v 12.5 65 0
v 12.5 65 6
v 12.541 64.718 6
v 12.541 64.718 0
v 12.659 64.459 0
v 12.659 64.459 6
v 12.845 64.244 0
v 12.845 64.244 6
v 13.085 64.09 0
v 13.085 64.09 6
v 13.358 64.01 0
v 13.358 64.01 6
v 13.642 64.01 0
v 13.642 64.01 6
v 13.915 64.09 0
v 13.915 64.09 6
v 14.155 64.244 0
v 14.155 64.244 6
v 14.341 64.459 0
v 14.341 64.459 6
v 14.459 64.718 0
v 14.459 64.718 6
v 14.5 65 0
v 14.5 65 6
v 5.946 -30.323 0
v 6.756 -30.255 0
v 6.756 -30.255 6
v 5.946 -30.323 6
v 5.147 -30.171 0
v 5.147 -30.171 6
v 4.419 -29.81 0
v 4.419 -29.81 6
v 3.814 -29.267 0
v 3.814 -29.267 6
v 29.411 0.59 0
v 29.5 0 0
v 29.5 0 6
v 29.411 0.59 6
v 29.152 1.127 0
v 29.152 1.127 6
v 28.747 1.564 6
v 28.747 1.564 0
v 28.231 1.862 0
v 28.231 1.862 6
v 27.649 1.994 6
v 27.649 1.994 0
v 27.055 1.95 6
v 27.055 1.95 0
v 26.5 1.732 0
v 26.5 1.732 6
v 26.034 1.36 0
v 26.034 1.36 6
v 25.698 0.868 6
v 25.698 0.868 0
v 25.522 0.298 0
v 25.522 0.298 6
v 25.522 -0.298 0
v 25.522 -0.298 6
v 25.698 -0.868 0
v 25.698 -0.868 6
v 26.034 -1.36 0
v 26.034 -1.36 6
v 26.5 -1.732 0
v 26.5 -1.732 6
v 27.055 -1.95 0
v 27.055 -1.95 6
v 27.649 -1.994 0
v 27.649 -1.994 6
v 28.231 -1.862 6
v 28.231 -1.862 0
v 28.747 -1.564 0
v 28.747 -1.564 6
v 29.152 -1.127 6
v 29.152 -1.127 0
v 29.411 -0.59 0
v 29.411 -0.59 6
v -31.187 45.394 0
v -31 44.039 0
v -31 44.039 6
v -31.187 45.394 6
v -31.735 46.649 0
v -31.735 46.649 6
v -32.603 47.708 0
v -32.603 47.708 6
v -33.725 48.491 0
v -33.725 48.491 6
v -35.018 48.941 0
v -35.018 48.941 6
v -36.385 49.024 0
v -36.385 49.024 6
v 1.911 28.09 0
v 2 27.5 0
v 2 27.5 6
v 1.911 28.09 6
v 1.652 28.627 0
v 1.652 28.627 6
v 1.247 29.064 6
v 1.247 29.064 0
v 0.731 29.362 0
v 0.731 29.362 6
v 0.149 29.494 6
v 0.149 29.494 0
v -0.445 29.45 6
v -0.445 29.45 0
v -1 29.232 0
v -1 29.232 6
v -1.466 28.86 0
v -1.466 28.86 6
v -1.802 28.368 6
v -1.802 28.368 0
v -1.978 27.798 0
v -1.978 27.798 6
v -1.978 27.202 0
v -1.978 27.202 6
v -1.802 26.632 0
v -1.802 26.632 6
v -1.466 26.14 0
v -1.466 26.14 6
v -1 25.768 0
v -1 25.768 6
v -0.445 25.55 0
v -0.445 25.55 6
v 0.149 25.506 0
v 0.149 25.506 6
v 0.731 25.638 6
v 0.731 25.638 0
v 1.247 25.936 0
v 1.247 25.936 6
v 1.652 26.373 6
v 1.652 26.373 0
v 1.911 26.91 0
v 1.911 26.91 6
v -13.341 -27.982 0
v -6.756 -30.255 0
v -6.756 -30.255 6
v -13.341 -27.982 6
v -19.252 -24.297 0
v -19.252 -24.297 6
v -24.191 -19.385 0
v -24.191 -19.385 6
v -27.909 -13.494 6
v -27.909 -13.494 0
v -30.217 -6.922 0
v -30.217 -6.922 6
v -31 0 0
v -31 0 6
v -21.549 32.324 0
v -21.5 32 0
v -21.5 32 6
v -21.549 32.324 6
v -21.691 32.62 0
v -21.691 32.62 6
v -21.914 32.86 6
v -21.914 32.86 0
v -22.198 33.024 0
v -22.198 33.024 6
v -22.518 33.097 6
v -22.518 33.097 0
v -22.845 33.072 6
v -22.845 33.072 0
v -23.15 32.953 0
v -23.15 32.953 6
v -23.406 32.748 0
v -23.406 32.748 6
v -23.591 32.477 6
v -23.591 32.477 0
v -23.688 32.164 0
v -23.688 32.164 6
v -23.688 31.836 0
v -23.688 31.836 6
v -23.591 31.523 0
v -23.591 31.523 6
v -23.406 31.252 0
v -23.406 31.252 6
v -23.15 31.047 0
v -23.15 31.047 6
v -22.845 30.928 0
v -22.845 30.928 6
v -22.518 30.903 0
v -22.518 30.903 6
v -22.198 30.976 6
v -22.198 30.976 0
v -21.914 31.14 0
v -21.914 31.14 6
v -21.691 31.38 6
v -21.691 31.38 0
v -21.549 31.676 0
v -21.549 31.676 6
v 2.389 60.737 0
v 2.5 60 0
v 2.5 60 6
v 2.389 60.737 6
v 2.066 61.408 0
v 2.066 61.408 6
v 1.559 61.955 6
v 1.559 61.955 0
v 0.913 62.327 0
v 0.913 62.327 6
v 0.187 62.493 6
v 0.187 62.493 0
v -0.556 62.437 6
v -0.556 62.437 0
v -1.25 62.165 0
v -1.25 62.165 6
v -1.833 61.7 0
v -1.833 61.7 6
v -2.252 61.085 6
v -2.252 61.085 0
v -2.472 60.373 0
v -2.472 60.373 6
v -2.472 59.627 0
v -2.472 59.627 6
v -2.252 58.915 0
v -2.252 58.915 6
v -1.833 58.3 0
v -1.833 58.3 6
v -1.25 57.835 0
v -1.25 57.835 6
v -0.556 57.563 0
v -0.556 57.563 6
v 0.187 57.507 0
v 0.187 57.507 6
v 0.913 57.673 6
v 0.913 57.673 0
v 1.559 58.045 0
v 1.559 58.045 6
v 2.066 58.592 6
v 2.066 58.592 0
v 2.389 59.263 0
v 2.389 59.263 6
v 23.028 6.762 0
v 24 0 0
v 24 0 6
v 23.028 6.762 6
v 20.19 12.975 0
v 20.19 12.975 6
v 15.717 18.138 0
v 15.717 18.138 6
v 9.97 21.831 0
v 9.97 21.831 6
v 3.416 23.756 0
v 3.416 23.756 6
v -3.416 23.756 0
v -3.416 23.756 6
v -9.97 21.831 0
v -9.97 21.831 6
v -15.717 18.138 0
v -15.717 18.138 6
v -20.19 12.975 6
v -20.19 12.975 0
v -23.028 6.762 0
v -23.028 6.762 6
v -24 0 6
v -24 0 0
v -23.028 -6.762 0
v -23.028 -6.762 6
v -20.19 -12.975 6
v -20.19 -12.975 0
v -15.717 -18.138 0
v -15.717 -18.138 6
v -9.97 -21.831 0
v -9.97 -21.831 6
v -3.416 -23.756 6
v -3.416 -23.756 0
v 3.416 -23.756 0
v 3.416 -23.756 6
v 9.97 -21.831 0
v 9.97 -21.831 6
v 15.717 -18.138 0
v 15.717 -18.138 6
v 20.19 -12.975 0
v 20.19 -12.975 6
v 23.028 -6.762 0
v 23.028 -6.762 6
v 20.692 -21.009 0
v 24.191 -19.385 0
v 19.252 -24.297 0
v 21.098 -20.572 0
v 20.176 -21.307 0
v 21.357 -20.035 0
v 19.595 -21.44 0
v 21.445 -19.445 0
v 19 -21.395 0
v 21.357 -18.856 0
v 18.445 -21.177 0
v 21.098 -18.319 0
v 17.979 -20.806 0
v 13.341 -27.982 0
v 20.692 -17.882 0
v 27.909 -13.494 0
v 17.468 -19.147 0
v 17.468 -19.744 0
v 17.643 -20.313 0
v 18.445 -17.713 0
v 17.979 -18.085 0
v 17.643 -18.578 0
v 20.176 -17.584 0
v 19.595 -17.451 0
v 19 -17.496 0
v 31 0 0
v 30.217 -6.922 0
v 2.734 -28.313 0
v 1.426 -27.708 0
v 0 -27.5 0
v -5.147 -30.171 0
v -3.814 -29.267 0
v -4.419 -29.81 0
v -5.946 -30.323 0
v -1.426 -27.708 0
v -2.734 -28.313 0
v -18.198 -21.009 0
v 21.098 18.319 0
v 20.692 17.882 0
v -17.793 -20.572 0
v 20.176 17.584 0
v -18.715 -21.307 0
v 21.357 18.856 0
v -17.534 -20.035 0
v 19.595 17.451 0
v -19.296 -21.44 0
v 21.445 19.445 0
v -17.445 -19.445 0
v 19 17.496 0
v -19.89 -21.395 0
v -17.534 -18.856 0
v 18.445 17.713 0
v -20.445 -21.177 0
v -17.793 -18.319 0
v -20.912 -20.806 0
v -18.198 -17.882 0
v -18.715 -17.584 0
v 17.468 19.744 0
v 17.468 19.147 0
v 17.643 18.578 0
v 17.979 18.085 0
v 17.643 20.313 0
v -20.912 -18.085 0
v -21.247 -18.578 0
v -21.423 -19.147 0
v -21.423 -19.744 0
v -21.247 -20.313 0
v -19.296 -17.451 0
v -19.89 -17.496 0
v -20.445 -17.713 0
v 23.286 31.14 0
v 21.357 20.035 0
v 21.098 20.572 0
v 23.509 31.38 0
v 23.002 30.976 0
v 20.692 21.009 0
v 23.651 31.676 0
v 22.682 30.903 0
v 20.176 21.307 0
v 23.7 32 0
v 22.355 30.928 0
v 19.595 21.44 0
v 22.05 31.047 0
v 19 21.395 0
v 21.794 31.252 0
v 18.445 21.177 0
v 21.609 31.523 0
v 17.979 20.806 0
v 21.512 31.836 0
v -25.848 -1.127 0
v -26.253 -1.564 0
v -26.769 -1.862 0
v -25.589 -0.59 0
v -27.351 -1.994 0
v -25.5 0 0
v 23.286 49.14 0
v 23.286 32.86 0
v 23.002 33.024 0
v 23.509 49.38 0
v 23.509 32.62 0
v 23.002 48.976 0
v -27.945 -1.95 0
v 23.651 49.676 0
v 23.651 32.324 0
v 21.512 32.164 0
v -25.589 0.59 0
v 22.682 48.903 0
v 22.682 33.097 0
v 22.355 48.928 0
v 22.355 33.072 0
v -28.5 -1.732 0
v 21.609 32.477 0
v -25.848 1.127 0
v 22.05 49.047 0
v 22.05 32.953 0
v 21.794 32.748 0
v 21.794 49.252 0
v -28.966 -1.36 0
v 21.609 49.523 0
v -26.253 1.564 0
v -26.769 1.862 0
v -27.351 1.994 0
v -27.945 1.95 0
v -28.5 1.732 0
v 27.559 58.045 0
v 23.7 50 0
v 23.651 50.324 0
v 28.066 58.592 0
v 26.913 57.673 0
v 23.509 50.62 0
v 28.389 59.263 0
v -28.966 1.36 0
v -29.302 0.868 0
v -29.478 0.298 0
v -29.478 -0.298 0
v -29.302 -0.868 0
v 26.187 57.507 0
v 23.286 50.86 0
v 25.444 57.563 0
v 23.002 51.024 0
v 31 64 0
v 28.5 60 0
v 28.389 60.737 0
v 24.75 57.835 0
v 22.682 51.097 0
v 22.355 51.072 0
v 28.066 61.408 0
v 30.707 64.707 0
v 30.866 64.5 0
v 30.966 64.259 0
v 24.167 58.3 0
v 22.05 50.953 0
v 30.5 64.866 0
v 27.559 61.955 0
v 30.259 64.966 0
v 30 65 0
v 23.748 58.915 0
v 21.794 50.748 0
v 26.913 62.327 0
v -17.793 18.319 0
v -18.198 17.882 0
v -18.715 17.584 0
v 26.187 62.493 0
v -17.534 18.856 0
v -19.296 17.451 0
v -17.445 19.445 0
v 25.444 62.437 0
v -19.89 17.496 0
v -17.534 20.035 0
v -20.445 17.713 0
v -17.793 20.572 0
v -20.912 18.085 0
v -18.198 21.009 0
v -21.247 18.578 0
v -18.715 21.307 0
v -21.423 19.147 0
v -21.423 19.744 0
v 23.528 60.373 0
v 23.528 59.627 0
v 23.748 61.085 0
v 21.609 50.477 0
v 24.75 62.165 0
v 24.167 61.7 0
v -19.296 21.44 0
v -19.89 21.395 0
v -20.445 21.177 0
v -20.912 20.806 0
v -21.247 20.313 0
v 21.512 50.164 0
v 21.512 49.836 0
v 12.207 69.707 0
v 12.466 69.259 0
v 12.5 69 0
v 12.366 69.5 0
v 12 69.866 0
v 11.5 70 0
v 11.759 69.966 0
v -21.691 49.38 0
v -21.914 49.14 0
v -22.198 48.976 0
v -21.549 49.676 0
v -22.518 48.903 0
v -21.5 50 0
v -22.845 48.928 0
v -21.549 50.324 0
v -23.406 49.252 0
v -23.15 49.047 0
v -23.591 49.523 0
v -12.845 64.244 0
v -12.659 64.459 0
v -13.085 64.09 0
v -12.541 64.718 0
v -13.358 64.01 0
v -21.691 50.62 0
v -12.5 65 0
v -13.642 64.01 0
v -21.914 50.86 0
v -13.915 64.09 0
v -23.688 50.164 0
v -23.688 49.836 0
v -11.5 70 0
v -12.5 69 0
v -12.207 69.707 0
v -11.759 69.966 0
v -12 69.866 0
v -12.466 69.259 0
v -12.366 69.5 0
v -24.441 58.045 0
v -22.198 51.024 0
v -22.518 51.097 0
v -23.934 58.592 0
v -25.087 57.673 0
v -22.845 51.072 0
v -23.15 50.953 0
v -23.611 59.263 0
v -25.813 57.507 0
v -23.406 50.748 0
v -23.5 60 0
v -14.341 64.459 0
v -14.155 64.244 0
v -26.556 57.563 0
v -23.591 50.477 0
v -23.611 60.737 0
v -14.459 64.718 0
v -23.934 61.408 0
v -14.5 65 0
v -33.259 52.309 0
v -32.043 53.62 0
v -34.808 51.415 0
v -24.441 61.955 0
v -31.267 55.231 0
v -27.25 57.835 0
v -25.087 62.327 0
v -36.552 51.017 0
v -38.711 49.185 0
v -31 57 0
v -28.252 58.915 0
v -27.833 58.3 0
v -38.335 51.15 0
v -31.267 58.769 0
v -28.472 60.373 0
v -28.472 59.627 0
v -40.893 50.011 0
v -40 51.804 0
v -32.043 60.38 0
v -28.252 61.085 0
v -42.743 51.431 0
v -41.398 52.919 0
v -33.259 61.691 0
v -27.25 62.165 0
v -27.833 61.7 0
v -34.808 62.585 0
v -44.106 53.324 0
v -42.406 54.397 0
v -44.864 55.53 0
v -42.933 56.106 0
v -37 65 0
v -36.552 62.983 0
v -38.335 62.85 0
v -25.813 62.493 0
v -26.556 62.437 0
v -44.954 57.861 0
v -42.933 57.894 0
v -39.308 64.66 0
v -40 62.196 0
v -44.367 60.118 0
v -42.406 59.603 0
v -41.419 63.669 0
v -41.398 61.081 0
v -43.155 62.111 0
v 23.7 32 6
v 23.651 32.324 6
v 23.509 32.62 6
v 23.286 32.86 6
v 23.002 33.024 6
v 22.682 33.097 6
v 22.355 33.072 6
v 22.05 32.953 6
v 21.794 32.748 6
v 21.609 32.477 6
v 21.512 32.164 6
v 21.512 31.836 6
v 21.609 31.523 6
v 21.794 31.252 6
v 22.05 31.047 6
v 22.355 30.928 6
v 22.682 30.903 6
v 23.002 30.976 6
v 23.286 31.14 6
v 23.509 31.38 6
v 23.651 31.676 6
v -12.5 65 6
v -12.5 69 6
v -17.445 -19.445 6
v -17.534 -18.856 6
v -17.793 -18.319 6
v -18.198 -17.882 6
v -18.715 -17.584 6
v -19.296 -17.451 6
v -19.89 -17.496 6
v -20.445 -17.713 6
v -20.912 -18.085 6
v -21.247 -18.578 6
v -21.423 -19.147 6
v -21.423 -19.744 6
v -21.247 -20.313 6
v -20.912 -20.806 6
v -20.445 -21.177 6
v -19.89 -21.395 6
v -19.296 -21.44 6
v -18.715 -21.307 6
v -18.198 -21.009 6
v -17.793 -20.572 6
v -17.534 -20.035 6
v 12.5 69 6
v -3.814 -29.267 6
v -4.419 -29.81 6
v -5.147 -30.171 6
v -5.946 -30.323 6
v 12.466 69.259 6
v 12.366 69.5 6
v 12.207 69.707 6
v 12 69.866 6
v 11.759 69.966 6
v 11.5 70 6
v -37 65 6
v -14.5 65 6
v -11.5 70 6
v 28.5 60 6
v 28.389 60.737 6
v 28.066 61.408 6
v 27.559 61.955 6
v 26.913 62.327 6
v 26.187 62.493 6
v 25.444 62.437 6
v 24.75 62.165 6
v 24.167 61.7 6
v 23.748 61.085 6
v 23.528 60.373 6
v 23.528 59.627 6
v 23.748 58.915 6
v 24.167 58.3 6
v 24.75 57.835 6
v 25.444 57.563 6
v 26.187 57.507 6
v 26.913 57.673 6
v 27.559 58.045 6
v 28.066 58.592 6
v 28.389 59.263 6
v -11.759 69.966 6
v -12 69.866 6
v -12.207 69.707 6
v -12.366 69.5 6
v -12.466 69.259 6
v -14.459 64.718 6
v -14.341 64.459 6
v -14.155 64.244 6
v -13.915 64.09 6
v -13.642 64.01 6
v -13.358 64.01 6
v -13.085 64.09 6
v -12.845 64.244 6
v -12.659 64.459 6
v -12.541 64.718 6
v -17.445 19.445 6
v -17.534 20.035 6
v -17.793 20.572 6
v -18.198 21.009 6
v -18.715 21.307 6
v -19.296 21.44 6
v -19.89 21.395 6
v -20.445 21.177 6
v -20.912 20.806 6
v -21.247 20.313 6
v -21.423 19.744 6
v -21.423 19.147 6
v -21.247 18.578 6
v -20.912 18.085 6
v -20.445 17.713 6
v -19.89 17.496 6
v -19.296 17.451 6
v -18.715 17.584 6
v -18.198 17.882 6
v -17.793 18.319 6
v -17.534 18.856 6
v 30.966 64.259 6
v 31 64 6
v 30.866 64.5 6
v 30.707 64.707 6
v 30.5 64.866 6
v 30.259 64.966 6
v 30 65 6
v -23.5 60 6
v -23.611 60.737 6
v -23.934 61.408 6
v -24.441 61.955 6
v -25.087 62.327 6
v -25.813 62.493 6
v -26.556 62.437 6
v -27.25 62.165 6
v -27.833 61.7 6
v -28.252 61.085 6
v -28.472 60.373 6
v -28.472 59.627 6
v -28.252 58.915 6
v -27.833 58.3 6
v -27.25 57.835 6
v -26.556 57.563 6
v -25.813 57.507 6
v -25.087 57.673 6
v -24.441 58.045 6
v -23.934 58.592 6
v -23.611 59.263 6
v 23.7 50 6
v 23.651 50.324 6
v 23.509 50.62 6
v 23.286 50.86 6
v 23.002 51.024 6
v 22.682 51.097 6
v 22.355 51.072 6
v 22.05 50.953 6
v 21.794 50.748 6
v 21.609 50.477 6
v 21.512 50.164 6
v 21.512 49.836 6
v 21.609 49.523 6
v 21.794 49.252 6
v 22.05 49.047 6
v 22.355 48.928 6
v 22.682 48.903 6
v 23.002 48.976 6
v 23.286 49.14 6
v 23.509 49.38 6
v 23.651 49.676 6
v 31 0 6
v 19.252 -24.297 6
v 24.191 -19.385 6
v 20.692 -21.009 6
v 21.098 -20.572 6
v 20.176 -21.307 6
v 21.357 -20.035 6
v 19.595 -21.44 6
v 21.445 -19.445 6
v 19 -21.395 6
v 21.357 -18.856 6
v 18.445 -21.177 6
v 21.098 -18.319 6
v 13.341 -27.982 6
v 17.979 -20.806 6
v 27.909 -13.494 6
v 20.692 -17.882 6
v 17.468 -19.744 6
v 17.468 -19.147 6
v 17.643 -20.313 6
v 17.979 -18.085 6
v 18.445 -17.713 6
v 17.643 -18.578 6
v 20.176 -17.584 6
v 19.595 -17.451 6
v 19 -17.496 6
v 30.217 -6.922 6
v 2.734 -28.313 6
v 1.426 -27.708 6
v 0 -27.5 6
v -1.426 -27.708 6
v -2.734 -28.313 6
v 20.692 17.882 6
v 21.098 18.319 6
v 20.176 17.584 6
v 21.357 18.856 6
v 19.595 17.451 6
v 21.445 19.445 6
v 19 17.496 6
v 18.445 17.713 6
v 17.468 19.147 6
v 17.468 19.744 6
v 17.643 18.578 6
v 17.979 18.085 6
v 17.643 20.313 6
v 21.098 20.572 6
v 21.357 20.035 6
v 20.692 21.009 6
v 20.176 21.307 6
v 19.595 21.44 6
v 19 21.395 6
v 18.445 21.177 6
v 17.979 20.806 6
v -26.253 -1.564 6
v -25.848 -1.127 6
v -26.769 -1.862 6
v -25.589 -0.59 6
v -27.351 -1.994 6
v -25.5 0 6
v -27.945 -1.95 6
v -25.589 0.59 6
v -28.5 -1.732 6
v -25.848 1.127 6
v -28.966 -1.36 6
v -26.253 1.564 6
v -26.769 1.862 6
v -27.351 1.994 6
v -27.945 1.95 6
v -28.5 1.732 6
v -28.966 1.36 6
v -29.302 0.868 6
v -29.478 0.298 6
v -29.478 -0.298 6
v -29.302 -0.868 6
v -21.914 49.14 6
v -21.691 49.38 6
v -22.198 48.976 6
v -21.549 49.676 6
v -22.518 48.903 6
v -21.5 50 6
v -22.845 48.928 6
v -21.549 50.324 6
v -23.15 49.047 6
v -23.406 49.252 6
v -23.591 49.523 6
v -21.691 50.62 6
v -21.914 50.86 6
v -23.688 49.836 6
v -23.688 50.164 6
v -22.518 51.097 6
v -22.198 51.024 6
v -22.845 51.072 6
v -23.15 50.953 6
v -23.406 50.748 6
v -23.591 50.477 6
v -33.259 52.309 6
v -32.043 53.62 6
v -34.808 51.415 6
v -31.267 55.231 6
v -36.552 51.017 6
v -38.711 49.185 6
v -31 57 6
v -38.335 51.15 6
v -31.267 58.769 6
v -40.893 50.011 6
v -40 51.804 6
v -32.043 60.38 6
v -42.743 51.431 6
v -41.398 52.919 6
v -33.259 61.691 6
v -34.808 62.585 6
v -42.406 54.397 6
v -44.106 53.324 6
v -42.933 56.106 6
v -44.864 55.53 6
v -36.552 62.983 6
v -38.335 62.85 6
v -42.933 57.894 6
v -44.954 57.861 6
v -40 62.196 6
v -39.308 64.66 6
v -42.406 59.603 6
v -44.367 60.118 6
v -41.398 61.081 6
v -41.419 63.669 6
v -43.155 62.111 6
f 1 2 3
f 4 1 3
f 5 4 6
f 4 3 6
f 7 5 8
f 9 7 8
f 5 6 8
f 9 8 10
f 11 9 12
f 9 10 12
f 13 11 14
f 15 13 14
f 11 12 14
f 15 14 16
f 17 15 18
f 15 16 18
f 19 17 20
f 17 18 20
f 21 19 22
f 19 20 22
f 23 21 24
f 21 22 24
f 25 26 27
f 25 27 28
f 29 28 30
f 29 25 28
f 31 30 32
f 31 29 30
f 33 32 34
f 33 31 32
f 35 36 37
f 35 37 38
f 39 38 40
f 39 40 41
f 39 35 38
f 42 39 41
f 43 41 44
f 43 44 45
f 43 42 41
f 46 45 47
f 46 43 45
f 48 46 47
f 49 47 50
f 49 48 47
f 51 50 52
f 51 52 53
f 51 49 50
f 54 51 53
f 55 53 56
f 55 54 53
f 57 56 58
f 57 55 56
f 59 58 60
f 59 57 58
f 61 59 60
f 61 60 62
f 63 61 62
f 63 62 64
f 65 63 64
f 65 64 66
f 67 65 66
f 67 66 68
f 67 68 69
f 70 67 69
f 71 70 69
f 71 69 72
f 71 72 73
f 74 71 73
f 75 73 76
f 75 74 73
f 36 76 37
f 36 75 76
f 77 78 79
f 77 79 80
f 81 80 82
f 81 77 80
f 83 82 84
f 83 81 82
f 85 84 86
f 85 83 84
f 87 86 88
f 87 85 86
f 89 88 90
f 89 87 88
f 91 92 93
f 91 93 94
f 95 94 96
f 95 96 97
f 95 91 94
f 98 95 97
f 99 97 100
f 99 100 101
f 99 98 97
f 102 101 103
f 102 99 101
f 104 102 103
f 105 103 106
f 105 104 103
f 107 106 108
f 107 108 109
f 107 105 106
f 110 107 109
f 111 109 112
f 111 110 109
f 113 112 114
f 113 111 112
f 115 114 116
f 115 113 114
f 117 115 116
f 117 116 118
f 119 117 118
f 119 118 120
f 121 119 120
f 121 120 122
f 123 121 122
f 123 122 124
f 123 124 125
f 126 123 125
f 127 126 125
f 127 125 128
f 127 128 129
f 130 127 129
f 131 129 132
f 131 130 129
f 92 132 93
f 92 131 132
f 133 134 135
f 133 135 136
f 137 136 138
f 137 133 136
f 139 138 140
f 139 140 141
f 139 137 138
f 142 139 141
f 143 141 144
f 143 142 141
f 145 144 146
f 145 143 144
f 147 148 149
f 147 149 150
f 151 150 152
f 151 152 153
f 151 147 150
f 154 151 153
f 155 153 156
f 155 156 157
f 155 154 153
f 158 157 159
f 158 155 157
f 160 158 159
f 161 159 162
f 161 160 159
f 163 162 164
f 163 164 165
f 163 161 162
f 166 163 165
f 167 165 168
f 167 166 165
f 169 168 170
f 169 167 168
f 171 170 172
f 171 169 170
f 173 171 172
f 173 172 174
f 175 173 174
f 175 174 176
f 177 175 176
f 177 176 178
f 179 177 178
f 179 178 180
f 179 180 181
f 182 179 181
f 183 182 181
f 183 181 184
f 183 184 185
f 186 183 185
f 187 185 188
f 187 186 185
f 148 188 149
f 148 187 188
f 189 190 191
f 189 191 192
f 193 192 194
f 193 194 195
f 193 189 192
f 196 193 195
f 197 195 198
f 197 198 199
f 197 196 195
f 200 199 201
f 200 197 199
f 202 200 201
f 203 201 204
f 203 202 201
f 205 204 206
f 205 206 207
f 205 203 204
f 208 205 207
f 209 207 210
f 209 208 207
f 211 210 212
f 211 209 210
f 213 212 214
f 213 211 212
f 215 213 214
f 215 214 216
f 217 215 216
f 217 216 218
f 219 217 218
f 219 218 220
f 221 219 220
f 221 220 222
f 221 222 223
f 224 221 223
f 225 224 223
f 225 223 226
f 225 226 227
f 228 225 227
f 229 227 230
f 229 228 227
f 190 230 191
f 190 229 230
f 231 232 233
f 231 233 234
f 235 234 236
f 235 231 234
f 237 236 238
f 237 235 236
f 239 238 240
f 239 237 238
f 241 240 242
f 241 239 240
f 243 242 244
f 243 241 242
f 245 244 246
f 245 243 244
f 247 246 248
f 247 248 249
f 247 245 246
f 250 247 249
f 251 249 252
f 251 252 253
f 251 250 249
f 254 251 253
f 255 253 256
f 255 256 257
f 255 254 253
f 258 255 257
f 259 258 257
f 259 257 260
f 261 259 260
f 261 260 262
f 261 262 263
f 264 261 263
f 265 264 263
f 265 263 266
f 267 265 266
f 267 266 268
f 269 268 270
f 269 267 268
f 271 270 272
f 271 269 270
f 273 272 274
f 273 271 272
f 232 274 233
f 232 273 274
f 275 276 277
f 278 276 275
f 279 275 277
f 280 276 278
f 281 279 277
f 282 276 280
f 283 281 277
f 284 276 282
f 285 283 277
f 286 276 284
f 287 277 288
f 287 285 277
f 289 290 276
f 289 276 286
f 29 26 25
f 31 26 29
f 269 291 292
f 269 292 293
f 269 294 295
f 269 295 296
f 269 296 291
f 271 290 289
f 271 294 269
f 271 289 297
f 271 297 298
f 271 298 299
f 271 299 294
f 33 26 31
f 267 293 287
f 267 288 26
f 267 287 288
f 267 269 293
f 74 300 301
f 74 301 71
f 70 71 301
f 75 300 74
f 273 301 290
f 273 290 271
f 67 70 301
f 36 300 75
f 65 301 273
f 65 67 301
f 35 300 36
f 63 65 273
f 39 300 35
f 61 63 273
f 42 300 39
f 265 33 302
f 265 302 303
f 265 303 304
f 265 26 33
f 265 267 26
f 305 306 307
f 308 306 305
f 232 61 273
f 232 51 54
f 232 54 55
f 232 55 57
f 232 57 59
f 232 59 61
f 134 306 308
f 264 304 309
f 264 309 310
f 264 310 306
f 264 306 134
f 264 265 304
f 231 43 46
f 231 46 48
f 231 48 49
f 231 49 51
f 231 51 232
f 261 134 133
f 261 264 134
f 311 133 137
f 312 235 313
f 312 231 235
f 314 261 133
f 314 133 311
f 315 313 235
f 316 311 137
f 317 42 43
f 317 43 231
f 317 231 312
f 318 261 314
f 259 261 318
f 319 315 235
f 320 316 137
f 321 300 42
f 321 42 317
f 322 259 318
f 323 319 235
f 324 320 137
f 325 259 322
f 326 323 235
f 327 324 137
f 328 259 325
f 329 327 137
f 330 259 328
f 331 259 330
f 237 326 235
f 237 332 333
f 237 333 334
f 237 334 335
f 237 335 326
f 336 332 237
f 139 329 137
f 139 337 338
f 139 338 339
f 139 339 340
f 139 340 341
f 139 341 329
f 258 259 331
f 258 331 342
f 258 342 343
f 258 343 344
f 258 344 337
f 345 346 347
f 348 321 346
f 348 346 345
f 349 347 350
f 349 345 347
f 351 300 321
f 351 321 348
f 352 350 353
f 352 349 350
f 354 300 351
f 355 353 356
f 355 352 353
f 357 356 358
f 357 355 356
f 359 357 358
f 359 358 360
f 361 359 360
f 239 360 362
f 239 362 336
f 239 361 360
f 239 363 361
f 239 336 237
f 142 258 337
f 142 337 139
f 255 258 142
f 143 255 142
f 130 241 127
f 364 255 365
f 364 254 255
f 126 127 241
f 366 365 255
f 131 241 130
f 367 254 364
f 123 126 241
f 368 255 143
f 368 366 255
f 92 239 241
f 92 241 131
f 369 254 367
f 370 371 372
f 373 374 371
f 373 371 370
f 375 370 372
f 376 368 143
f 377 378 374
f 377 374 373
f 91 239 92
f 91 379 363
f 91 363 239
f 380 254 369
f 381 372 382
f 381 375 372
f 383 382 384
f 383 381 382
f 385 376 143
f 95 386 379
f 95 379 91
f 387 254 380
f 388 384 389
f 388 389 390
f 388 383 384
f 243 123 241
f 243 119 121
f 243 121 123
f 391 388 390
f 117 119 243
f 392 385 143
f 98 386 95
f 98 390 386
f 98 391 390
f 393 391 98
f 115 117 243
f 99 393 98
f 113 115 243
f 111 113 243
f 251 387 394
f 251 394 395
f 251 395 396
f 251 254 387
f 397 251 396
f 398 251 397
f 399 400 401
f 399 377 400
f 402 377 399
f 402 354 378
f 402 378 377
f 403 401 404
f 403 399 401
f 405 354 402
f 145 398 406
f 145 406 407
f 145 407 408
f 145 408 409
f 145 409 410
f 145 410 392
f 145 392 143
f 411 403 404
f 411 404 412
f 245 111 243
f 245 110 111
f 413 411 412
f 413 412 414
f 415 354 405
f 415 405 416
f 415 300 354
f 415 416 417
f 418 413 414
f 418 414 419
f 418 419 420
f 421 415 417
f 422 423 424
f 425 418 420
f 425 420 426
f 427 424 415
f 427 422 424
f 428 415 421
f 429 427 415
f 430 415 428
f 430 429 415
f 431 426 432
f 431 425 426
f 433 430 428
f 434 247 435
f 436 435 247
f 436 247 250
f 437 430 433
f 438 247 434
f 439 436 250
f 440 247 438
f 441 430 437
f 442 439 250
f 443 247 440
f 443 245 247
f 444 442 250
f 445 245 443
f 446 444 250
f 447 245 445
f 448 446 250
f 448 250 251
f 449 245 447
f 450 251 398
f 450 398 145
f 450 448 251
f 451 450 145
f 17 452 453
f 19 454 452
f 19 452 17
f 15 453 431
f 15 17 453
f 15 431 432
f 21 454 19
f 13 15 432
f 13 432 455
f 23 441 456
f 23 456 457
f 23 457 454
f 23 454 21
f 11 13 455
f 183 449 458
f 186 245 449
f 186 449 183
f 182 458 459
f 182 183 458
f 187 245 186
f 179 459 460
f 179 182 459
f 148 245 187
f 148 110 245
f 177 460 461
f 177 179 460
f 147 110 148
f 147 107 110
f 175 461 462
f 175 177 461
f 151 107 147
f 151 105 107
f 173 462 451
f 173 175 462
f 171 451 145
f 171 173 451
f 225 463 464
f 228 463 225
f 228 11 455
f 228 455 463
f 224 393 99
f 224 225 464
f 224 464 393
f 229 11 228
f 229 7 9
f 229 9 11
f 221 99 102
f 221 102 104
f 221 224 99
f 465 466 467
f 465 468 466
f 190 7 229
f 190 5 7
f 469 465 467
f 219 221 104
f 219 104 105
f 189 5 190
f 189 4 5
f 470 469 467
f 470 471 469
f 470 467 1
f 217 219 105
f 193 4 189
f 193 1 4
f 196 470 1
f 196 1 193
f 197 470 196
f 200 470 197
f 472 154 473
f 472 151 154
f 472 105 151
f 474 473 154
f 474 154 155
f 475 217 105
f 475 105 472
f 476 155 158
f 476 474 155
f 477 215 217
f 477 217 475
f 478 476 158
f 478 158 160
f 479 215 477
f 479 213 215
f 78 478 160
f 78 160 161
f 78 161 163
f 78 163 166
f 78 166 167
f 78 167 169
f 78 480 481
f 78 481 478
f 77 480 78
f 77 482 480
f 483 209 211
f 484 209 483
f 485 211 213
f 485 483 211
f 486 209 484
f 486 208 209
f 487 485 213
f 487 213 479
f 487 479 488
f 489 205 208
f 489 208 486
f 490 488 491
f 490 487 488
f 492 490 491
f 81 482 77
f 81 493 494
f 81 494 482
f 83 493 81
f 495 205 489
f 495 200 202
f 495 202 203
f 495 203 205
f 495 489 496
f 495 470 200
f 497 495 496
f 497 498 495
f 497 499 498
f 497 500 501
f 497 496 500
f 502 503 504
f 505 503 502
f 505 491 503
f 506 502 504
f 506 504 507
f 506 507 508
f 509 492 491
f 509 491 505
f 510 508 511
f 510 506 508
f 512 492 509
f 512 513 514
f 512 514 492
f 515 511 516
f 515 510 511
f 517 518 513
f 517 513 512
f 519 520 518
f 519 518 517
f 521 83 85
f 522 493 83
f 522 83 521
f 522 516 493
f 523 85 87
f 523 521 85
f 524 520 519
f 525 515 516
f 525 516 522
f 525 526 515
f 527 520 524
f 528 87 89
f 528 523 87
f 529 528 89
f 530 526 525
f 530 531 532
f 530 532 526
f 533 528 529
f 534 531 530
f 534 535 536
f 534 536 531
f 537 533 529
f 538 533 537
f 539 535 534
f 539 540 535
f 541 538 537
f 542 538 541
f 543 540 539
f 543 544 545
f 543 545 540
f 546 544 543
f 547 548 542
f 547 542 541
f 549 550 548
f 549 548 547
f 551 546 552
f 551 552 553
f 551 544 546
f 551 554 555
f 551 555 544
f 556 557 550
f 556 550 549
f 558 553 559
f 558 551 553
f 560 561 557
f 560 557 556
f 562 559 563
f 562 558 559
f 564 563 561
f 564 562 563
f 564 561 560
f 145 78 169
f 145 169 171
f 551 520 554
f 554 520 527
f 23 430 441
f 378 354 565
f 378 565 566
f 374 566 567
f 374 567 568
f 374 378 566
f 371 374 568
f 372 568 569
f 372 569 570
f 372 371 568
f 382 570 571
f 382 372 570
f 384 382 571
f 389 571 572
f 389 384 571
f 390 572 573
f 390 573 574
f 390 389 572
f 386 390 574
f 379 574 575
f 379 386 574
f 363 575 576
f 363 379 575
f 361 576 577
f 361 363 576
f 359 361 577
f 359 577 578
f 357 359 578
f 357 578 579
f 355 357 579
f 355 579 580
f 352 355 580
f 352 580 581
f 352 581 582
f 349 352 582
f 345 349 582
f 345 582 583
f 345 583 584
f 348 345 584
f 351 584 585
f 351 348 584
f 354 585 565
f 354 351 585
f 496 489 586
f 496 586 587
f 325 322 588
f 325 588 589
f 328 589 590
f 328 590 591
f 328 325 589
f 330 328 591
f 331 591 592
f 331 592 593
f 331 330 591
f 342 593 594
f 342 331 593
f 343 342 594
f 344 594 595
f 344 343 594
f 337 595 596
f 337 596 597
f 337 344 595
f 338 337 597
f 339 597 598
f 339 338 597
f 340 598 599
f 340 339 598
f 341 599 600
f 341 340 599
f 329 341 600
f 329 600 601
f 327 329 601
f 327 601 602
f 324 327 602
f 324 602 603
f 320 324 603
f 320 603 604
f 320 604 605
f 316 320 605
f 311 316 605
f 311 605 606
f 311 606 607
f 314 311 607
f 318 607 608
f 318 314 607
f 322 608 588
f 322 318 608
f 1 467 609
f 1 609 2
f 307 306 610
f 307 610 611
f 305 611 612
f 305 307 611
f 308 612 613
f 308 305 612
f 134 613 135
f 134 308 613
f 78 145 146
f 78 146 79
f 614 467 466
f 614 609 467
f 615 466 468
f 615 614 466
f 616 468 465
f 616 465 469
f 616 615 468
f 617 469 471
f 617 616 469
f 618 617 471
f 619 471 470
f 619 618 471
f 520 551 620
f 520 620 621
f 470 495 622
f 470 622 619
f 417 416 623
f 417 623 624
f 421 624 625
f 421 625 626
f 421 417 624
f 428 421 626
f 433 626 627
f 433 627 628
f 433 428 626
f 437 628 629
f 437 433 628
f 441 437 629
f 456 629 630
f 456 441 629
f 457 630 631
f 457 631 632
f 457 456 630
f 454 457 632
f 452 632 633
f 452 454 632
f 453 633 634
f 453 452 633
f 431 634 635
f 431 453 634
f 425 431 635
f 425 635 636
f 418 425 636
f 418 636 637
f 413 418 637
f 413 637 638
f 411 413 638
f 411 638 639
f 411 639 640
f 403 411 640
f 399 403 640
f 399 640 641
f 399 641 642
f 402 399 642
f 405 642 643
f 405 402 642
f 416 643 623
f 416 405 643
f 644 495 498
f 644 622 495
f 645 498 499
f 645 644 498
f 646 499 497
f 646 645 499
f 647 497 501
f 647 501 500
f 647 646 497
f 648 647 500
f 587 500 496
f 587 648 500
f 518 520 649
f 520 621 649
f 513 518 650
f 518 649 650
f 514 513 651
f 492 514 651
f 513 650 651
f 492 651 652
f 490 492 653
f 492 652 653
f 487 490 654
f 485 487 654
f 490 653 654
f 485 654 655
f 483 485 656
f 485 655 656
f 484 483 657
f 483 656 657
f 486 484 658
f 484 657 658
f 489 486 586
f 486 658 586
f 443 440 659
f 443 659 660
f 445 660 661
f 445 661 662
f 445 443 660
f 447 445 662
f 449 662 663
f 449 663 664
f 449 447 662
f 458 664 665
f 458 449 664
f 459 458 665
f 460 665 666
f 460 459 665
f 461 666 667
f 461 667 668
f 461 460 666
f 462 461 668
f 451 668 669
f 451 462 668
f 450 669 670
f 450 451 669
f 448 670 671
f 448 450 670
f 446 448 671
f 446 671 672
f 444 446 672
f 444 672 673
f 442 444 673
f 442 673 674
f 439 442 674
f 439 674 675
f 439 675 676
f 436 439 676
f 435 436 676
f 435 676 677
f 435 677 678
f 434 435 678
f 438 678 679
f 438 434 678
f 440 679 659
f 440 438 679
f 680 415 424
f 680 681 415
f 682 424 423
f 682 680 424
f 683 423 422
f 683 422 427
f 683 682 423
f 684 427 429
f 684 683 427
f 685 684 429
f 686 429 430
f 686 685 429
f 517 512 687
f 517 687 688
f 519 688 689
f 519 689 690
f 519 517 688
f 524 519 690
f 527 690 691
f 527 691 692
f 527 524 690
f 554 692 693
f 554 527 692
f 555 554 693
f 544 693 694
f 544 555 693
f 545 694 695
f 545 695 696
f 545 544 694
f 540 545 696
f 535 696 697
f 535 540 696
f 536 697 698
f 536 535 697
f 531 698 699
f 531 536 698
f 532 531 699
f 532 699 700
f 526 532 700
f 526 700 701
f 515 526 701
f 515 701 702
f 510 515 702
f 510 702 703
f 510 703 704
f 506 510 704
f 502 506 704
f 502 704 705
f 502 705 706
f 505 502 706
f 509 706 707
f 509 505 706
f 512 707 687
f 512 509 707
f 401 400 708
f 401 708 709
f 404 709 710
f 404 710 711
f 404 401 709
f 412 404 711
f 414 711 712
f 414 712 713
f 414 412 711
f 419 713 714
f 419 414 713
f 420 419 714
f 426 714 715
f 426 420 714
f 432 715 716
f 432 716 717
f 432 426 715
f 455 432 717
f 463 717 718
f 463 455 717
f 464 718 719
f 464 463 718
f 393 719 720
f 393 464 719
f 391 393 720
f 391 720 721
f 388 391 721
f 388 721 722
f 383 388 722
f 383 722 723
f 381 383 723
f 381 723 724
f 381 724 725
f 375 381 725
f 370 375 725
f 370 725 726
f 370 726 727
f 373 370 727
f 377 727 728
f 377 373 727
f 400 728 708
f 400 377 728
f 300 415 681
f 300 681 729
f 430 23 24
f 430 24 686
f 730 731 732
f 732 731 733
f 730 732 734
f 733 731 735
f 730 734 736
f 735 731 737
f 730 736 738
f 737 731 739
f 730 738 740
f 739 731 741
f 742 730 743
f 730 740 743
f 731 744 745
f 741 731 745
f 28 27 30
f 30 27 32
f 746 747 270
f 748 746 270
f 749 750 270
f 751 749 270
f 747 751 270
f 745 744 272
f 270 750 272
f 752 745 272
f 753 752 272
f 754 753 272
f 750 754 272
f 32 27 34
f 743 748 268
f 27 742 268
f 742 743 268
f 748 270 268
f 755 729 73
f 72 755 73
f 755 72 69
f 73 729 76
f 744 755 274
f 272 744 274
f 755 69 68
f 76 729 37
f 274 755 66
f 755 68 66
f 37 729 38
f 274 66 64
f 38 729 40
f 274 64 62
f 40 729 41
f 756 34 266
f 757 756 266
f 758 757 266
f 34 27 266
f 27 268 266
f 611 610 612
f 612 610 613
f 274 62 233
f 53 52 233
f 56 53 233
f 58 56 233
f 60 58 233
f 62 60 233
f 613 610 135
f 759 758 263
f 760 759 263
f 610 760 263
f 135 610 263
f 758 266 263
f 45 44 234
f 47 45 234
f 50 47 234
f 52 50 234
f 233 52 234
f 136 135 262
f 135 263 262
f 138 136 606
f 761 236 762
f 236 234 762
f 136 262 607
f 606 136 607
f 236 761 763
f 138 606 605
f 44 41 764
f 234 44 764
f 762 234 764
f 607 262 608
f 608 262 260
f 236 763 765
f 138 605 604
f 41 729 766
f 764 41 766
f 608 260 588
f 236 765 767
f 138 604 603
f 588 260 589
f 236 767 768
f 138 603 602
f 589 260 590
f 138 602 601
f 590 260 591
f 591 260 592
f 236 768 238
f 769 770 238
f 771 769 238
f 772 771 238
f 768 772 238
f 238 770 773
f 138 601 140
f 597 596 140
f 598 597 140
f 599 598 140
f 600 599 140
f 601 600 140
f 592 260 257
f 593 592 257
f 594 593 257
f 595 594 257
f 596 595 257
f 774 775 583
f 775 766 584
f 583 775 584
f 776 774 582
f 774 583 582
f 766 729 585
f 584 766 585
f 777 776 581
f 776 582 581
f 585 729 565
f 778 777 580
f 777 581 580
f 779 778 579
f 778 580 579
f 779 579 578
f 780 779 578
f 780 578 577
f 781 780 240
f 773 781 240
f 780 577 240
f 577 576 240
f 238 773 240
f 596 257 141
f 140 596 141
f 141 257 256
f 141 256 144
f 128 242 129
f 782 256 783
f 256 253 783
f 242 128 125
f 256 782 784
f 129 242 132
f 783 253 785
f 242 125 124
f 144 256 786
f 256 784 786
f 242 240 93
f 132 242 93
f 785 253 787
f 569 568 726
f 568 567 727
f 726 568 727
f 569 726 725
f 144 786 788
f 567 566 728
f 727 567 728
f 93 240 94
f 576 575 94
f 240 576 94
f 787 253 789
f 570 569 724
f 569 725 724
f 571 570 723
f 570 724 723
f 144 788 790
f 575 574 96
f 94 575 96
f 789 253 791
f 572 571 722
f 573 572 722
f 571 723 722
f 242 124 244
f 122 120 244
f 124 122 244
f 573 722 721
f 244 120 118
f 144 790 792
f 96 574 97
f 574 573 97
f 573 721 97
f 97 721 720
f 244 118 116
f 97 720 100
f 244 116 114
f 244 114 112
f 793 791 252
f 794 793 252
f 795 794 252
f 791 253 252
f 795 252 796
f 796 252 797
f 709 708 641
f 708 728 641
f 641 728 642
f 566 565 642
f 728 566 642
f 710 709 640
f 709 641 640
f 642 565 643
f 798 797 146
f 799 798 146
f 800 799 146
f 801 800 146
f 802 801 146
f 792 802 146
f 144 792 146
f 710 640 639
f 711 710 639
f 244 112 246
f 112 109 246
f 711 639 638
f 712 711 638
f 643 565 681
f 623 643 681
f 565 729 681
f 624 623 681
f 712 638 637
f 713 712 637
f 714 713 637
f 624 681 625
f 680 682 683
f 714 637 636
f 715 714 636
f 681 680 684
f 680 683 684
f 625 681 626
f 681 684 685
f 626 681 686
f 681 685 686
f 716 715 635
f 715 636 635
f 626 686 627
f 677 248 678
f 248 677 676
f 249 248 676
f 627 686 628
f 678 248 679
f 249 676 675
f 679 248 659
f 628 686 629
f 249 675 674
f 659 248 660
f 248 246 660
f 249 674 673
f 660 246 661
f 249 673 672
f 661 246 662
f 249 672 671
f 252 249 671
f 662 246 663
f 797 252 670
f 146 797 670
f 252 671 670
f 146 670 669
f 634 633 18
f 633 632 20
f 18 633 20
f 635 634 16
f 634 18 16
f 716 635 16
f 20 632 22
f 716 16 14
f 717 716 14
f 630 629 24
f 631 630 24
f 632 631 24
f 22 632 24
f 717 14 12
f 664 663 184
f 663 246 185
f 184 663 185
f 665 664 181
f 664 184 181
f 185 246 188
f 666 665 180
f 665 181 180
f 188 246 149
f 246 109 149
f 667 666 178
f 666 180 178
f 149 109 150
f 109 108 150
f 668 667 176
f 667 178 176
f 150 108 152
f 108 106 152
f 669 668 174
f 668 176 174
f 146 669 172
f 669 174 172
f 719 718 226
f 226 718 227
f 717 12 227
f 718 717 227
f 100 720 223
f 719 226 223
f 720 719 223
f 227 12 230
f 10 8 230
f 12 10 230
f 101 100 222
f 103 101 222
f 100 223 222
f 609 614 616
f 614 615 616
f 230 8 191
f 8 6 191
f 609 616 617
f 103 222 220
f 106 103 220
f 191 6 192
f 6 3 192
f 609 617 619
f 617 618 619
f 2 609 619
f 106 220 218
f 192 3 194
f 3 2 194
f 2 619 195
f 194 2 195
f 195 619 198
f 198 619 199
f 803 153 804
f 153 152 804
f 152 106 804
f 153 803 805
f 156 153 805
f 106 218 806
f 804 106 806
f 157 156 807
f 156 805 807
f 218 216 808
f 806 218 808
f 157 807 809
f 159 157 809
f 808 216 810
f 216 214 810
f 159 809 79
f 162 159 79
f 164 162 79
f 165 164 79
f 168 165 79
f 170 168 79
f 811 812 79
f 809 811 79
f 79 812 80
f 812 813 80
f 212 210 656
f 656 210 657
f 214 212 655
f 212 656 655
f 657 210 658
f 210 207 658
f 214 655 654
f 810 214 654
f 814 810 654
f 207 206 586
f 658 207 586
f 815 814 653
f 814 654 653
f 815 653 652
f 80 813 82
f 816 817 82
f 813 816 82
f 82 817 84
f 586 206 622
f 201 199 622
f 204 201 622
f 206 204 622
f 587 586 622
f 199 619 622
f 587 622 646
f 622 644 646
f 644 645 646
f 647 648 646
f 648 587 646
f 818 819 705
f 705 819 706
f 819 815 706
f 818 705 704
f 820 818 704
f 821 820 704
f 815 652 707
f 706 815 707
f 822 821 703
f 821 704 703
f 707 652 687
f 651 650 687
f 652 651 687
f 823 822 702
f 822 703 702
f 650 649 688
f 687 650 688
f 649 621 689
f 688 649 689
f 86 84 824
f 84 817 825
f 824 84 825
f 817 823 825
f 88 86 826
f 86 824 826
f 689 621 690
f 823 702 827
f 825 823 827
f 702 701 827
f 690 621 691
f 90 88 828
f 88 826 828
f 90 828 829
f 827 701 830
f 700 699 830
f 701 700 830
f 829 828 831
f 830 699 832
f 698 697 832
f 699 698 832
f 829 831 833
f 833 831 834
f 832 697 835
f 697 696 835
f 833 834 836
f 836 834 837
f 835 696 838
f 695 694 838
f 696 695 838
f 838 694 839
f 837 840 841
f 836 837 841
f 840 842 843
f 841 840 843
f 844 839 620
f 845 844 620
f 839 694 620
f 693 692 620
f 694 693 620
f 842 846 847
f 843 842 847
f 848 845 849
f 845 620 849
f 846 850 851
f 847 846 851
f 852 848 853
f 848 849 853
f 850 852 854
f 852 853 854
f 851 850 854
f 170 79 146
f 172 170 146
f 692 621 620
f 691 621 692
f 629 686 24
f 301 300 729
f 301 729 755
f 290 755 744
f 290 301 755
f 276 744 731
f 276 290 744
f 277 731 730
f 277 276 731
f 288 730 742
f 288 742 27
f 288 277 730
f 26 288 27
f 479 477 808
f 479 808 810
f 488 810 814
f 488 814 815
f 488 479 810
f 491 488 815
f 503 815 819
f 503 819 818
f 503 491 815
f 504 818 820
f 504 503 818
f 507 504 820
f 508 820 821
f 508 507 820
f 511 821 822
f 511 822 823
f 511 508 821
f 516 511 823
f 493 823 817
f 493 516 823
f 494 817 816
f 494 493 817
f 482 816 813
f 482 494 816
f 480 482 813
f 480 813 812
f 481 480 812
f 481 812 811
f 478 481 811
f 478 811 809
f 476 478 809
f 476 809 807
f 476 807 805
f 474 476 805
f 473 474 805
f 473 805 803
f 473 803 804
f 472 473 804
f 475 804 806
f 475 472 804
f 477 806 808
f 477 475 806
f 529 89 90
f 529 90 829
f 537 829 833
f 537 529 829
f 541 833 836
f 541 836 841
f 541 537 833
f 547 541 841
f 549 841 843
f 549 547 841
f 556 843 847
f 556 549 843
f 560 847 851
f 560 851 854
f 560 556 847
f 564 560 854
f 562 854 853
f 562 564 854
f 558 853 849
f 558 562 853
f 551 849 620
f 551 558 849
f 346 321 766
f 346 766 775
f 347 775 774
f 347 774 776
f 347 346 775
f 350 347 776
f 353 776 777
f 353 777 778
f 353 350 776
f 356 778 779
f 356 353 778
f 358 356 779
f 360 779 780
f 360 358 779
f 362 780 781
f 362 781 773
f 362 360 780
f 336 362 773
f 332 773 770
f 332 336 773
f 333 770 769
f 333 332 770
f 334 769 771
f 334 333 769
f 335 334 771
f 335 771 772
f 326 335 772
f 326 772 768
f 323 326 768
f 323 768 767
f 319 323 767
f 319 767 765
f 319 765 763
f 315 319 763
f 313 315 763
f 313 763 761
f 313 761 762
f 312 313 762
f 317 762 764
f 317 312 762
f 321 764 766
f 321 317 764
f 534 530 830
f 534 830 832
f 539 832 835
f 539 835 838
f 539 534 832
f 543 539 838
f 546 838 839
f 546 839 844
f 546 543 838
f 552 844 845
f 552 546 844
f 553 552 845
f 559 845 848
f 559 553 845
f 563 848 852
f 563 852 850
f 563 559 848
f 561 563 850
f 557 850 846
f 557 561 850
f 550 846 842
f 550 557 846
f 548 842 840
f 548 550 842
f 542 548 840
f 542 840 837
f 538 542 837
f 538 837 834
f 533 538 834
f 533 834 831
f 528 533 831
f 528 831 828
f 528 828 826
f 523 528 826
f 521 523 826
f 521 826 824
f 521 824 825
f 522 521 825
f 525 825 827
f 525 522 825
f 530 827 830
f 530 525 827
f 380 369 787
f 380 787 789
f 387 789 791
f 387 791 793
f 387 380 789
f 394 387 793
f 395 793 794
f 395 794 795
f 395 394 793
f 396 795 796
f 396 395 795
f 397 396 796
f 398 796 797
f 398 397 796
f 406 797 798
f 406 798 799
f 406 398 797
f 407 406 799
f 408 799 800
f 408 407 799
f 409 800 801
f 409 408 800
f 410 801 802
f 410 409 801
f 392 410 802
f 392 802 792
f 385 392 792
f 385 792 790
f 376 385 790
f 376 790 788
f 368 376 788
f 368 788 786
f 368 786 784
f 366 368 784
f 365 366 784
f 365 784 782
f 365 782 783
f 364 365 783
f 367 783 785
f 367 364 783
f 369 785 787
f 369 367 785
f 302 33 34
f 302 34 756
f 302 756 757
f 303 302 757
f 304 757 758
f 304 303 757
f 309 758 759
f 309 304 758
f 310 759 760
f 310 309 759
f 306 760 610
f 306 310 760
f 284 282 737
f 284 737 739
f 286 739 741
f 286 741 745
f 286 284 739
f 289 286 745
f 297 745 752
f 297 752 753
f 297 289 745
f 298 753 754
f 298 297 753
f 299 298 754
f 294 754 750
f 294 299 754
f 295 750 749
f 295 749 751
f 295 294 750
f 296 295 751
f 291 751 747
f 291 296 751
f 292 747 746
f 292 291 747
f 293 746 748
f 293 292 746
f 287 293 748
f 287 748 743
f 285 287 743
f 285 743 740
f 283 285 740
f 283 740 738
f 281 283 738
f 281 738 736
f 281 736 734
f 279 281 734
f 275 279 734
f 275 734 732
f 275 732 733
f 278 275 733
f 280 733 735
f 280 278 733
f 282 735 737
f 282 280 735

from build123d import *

# Parameters (mm, degrees)
SKETCH_1_R          = 24
SKETCH_1_R_2        = 2
SKETCH_1_R_3        = 2.5
SKETCH_1_R_4        = 1.1
SKETCH_1_R_5        = 6
EXTRUDE_1_DEPTH     = 6
SKETCH_2_R          = 1
CUT_EXTRUDE_1_DEPTH = 84.432607534
FILLET_1_R          = 1


with BuildPart() as part:
    # 草图1 → 凸台-拉伸1 (new body)
    with BuildSketch(Plane.XY):
        with BuildLine():
            Line((-31, 0), (-31, 44.038518603))
            ThreePointArc((-31, 44.038518603), (-32.603168898, 47.707515532), (-36.384615385, 49.023703756))
            ThreePointArc((-36.384615385, 49.023703756), (-44.994071865, 56.692079518), (-37, 65))
            Line((-37, 65), (-12.5, 65))
            Line((-12.5, 65), (-12.5, 70))
            Line((-12.5, 70), (12.5, 70))
            Line((12.5, 70), (12.5, 65))
            Line((12.5, 65), (31, 65))
            Line((31, 65), (31, 0))
            ThreePointArc((31, 0), (24.191352338, -19.385006373), (6.756227609, -30.254807692))
            ThreePointArc((6.756227609, -30.254807692), (5.147421514, -30.170867126), (3.813999457, -29.266826923))
            ThreePointArc((3.813999457, -29.266826923), (0, -27.5), (-3.813999457, -29.266826923))
            ThreePointArc((-3.813999457, -29.266826923), (-5.147421514, -30.170867126), (-6.756227609, -30.254807692))
            ThreePointArc((-6.756227609, -30.254807692), (-24.191352338, -19.385006373), (-31, 0))
        make_face()
        Circle(SKETCH_1_R, mode=Mode.SUBTRACT)
        with Locations((-19.445436483, 19.445436483)):
            Circle(SKETCH_1_R_2, mode=Mode.SUBTRACT)
        with Locations((0, 27.5)):
            Circle(SKETCH_1_R_2, mode=Mode.SUBTRACT)
        with Locations((19.445436483, 19.445436483)):
            Circle(SKETCH_1_R_2, mode=Mode.SUBTRACT)
        with Locations((27.5, 0)):
            Circle(SKETCH_1_R_2, mode=Mode.SUBTRACT)
        with Locations((19.445436483, -19.445436483)):
            Circle(SKETCH_1_R_2, mode=Mode.SUBTRACT)
        with Locations((-19.445436483, -19.445436483)):
            Circle(SKETCH_1_R_2, mode=Mode.SUBTRACT)
        with Locations((-27.5, 0)):
            Circle(SKETCH_1_R_2, mode=Mode.SUBTRACT)
        with Locations((-26, 60)):
            Circle(SKETCH_1_R_3, mode=Mode.SUBTRACT)
        with Locations((0, 60)):
            Circle(SKETCH_1_R_3, mode=Mode.SUBTRACT)
        with Locations((26, 60)):
            Circle(SKETCH_1_R_3, mode=Mode.SUBTRACT)
        with Locations((-22.6, 50)):
            Circle(SKETCH_1_R_4, mode=Mode.SUBTRACT)
        with Locations((-22.6, 32)):
            Circle(SKETCH_1_R_4, mode=Mode.SUBTRACT)
        with Locations((22.6, 32)):
            Circle(SKETCH_1_R_4, mode=Mode.SUBTRACT)
        with Locations((22.6, 50)):
            Circle(SKETCH_1_R_4, mode=Mode.SUBTRACT)
        with Locations((-37, 57)):
            Circle(SKETCH_1_R_5, mode=Mode.SUBTRACT)
    extrude(amount=EXTRUDE_1_DEPTH)

    # 草图2 → 切除-拉伸1 (cut, through all)
    with BuildSketch(Plane.XY.offset(6)):
        with Locations((-13.5, 65)):
            Circle(SKETCH_2_R)
        with Locations((13.5, 65)):
            Circle(SKETCH_2_R)
    extrude(amount=-CUT_EXTRUDE_1_DEPTH, mode=Mode.SUBTRACT)

    # 圆角1
    fillet_1_edges = [part.edges().sort_by_distance(p)[0] for p in [
        (-12.5, 70, 3),
        (12.5, 70, 3),
        (31, 65, 3),
    ]]
    fillet(fillet_1_edges, radius=FILLET_1_R)


solid = part.part
